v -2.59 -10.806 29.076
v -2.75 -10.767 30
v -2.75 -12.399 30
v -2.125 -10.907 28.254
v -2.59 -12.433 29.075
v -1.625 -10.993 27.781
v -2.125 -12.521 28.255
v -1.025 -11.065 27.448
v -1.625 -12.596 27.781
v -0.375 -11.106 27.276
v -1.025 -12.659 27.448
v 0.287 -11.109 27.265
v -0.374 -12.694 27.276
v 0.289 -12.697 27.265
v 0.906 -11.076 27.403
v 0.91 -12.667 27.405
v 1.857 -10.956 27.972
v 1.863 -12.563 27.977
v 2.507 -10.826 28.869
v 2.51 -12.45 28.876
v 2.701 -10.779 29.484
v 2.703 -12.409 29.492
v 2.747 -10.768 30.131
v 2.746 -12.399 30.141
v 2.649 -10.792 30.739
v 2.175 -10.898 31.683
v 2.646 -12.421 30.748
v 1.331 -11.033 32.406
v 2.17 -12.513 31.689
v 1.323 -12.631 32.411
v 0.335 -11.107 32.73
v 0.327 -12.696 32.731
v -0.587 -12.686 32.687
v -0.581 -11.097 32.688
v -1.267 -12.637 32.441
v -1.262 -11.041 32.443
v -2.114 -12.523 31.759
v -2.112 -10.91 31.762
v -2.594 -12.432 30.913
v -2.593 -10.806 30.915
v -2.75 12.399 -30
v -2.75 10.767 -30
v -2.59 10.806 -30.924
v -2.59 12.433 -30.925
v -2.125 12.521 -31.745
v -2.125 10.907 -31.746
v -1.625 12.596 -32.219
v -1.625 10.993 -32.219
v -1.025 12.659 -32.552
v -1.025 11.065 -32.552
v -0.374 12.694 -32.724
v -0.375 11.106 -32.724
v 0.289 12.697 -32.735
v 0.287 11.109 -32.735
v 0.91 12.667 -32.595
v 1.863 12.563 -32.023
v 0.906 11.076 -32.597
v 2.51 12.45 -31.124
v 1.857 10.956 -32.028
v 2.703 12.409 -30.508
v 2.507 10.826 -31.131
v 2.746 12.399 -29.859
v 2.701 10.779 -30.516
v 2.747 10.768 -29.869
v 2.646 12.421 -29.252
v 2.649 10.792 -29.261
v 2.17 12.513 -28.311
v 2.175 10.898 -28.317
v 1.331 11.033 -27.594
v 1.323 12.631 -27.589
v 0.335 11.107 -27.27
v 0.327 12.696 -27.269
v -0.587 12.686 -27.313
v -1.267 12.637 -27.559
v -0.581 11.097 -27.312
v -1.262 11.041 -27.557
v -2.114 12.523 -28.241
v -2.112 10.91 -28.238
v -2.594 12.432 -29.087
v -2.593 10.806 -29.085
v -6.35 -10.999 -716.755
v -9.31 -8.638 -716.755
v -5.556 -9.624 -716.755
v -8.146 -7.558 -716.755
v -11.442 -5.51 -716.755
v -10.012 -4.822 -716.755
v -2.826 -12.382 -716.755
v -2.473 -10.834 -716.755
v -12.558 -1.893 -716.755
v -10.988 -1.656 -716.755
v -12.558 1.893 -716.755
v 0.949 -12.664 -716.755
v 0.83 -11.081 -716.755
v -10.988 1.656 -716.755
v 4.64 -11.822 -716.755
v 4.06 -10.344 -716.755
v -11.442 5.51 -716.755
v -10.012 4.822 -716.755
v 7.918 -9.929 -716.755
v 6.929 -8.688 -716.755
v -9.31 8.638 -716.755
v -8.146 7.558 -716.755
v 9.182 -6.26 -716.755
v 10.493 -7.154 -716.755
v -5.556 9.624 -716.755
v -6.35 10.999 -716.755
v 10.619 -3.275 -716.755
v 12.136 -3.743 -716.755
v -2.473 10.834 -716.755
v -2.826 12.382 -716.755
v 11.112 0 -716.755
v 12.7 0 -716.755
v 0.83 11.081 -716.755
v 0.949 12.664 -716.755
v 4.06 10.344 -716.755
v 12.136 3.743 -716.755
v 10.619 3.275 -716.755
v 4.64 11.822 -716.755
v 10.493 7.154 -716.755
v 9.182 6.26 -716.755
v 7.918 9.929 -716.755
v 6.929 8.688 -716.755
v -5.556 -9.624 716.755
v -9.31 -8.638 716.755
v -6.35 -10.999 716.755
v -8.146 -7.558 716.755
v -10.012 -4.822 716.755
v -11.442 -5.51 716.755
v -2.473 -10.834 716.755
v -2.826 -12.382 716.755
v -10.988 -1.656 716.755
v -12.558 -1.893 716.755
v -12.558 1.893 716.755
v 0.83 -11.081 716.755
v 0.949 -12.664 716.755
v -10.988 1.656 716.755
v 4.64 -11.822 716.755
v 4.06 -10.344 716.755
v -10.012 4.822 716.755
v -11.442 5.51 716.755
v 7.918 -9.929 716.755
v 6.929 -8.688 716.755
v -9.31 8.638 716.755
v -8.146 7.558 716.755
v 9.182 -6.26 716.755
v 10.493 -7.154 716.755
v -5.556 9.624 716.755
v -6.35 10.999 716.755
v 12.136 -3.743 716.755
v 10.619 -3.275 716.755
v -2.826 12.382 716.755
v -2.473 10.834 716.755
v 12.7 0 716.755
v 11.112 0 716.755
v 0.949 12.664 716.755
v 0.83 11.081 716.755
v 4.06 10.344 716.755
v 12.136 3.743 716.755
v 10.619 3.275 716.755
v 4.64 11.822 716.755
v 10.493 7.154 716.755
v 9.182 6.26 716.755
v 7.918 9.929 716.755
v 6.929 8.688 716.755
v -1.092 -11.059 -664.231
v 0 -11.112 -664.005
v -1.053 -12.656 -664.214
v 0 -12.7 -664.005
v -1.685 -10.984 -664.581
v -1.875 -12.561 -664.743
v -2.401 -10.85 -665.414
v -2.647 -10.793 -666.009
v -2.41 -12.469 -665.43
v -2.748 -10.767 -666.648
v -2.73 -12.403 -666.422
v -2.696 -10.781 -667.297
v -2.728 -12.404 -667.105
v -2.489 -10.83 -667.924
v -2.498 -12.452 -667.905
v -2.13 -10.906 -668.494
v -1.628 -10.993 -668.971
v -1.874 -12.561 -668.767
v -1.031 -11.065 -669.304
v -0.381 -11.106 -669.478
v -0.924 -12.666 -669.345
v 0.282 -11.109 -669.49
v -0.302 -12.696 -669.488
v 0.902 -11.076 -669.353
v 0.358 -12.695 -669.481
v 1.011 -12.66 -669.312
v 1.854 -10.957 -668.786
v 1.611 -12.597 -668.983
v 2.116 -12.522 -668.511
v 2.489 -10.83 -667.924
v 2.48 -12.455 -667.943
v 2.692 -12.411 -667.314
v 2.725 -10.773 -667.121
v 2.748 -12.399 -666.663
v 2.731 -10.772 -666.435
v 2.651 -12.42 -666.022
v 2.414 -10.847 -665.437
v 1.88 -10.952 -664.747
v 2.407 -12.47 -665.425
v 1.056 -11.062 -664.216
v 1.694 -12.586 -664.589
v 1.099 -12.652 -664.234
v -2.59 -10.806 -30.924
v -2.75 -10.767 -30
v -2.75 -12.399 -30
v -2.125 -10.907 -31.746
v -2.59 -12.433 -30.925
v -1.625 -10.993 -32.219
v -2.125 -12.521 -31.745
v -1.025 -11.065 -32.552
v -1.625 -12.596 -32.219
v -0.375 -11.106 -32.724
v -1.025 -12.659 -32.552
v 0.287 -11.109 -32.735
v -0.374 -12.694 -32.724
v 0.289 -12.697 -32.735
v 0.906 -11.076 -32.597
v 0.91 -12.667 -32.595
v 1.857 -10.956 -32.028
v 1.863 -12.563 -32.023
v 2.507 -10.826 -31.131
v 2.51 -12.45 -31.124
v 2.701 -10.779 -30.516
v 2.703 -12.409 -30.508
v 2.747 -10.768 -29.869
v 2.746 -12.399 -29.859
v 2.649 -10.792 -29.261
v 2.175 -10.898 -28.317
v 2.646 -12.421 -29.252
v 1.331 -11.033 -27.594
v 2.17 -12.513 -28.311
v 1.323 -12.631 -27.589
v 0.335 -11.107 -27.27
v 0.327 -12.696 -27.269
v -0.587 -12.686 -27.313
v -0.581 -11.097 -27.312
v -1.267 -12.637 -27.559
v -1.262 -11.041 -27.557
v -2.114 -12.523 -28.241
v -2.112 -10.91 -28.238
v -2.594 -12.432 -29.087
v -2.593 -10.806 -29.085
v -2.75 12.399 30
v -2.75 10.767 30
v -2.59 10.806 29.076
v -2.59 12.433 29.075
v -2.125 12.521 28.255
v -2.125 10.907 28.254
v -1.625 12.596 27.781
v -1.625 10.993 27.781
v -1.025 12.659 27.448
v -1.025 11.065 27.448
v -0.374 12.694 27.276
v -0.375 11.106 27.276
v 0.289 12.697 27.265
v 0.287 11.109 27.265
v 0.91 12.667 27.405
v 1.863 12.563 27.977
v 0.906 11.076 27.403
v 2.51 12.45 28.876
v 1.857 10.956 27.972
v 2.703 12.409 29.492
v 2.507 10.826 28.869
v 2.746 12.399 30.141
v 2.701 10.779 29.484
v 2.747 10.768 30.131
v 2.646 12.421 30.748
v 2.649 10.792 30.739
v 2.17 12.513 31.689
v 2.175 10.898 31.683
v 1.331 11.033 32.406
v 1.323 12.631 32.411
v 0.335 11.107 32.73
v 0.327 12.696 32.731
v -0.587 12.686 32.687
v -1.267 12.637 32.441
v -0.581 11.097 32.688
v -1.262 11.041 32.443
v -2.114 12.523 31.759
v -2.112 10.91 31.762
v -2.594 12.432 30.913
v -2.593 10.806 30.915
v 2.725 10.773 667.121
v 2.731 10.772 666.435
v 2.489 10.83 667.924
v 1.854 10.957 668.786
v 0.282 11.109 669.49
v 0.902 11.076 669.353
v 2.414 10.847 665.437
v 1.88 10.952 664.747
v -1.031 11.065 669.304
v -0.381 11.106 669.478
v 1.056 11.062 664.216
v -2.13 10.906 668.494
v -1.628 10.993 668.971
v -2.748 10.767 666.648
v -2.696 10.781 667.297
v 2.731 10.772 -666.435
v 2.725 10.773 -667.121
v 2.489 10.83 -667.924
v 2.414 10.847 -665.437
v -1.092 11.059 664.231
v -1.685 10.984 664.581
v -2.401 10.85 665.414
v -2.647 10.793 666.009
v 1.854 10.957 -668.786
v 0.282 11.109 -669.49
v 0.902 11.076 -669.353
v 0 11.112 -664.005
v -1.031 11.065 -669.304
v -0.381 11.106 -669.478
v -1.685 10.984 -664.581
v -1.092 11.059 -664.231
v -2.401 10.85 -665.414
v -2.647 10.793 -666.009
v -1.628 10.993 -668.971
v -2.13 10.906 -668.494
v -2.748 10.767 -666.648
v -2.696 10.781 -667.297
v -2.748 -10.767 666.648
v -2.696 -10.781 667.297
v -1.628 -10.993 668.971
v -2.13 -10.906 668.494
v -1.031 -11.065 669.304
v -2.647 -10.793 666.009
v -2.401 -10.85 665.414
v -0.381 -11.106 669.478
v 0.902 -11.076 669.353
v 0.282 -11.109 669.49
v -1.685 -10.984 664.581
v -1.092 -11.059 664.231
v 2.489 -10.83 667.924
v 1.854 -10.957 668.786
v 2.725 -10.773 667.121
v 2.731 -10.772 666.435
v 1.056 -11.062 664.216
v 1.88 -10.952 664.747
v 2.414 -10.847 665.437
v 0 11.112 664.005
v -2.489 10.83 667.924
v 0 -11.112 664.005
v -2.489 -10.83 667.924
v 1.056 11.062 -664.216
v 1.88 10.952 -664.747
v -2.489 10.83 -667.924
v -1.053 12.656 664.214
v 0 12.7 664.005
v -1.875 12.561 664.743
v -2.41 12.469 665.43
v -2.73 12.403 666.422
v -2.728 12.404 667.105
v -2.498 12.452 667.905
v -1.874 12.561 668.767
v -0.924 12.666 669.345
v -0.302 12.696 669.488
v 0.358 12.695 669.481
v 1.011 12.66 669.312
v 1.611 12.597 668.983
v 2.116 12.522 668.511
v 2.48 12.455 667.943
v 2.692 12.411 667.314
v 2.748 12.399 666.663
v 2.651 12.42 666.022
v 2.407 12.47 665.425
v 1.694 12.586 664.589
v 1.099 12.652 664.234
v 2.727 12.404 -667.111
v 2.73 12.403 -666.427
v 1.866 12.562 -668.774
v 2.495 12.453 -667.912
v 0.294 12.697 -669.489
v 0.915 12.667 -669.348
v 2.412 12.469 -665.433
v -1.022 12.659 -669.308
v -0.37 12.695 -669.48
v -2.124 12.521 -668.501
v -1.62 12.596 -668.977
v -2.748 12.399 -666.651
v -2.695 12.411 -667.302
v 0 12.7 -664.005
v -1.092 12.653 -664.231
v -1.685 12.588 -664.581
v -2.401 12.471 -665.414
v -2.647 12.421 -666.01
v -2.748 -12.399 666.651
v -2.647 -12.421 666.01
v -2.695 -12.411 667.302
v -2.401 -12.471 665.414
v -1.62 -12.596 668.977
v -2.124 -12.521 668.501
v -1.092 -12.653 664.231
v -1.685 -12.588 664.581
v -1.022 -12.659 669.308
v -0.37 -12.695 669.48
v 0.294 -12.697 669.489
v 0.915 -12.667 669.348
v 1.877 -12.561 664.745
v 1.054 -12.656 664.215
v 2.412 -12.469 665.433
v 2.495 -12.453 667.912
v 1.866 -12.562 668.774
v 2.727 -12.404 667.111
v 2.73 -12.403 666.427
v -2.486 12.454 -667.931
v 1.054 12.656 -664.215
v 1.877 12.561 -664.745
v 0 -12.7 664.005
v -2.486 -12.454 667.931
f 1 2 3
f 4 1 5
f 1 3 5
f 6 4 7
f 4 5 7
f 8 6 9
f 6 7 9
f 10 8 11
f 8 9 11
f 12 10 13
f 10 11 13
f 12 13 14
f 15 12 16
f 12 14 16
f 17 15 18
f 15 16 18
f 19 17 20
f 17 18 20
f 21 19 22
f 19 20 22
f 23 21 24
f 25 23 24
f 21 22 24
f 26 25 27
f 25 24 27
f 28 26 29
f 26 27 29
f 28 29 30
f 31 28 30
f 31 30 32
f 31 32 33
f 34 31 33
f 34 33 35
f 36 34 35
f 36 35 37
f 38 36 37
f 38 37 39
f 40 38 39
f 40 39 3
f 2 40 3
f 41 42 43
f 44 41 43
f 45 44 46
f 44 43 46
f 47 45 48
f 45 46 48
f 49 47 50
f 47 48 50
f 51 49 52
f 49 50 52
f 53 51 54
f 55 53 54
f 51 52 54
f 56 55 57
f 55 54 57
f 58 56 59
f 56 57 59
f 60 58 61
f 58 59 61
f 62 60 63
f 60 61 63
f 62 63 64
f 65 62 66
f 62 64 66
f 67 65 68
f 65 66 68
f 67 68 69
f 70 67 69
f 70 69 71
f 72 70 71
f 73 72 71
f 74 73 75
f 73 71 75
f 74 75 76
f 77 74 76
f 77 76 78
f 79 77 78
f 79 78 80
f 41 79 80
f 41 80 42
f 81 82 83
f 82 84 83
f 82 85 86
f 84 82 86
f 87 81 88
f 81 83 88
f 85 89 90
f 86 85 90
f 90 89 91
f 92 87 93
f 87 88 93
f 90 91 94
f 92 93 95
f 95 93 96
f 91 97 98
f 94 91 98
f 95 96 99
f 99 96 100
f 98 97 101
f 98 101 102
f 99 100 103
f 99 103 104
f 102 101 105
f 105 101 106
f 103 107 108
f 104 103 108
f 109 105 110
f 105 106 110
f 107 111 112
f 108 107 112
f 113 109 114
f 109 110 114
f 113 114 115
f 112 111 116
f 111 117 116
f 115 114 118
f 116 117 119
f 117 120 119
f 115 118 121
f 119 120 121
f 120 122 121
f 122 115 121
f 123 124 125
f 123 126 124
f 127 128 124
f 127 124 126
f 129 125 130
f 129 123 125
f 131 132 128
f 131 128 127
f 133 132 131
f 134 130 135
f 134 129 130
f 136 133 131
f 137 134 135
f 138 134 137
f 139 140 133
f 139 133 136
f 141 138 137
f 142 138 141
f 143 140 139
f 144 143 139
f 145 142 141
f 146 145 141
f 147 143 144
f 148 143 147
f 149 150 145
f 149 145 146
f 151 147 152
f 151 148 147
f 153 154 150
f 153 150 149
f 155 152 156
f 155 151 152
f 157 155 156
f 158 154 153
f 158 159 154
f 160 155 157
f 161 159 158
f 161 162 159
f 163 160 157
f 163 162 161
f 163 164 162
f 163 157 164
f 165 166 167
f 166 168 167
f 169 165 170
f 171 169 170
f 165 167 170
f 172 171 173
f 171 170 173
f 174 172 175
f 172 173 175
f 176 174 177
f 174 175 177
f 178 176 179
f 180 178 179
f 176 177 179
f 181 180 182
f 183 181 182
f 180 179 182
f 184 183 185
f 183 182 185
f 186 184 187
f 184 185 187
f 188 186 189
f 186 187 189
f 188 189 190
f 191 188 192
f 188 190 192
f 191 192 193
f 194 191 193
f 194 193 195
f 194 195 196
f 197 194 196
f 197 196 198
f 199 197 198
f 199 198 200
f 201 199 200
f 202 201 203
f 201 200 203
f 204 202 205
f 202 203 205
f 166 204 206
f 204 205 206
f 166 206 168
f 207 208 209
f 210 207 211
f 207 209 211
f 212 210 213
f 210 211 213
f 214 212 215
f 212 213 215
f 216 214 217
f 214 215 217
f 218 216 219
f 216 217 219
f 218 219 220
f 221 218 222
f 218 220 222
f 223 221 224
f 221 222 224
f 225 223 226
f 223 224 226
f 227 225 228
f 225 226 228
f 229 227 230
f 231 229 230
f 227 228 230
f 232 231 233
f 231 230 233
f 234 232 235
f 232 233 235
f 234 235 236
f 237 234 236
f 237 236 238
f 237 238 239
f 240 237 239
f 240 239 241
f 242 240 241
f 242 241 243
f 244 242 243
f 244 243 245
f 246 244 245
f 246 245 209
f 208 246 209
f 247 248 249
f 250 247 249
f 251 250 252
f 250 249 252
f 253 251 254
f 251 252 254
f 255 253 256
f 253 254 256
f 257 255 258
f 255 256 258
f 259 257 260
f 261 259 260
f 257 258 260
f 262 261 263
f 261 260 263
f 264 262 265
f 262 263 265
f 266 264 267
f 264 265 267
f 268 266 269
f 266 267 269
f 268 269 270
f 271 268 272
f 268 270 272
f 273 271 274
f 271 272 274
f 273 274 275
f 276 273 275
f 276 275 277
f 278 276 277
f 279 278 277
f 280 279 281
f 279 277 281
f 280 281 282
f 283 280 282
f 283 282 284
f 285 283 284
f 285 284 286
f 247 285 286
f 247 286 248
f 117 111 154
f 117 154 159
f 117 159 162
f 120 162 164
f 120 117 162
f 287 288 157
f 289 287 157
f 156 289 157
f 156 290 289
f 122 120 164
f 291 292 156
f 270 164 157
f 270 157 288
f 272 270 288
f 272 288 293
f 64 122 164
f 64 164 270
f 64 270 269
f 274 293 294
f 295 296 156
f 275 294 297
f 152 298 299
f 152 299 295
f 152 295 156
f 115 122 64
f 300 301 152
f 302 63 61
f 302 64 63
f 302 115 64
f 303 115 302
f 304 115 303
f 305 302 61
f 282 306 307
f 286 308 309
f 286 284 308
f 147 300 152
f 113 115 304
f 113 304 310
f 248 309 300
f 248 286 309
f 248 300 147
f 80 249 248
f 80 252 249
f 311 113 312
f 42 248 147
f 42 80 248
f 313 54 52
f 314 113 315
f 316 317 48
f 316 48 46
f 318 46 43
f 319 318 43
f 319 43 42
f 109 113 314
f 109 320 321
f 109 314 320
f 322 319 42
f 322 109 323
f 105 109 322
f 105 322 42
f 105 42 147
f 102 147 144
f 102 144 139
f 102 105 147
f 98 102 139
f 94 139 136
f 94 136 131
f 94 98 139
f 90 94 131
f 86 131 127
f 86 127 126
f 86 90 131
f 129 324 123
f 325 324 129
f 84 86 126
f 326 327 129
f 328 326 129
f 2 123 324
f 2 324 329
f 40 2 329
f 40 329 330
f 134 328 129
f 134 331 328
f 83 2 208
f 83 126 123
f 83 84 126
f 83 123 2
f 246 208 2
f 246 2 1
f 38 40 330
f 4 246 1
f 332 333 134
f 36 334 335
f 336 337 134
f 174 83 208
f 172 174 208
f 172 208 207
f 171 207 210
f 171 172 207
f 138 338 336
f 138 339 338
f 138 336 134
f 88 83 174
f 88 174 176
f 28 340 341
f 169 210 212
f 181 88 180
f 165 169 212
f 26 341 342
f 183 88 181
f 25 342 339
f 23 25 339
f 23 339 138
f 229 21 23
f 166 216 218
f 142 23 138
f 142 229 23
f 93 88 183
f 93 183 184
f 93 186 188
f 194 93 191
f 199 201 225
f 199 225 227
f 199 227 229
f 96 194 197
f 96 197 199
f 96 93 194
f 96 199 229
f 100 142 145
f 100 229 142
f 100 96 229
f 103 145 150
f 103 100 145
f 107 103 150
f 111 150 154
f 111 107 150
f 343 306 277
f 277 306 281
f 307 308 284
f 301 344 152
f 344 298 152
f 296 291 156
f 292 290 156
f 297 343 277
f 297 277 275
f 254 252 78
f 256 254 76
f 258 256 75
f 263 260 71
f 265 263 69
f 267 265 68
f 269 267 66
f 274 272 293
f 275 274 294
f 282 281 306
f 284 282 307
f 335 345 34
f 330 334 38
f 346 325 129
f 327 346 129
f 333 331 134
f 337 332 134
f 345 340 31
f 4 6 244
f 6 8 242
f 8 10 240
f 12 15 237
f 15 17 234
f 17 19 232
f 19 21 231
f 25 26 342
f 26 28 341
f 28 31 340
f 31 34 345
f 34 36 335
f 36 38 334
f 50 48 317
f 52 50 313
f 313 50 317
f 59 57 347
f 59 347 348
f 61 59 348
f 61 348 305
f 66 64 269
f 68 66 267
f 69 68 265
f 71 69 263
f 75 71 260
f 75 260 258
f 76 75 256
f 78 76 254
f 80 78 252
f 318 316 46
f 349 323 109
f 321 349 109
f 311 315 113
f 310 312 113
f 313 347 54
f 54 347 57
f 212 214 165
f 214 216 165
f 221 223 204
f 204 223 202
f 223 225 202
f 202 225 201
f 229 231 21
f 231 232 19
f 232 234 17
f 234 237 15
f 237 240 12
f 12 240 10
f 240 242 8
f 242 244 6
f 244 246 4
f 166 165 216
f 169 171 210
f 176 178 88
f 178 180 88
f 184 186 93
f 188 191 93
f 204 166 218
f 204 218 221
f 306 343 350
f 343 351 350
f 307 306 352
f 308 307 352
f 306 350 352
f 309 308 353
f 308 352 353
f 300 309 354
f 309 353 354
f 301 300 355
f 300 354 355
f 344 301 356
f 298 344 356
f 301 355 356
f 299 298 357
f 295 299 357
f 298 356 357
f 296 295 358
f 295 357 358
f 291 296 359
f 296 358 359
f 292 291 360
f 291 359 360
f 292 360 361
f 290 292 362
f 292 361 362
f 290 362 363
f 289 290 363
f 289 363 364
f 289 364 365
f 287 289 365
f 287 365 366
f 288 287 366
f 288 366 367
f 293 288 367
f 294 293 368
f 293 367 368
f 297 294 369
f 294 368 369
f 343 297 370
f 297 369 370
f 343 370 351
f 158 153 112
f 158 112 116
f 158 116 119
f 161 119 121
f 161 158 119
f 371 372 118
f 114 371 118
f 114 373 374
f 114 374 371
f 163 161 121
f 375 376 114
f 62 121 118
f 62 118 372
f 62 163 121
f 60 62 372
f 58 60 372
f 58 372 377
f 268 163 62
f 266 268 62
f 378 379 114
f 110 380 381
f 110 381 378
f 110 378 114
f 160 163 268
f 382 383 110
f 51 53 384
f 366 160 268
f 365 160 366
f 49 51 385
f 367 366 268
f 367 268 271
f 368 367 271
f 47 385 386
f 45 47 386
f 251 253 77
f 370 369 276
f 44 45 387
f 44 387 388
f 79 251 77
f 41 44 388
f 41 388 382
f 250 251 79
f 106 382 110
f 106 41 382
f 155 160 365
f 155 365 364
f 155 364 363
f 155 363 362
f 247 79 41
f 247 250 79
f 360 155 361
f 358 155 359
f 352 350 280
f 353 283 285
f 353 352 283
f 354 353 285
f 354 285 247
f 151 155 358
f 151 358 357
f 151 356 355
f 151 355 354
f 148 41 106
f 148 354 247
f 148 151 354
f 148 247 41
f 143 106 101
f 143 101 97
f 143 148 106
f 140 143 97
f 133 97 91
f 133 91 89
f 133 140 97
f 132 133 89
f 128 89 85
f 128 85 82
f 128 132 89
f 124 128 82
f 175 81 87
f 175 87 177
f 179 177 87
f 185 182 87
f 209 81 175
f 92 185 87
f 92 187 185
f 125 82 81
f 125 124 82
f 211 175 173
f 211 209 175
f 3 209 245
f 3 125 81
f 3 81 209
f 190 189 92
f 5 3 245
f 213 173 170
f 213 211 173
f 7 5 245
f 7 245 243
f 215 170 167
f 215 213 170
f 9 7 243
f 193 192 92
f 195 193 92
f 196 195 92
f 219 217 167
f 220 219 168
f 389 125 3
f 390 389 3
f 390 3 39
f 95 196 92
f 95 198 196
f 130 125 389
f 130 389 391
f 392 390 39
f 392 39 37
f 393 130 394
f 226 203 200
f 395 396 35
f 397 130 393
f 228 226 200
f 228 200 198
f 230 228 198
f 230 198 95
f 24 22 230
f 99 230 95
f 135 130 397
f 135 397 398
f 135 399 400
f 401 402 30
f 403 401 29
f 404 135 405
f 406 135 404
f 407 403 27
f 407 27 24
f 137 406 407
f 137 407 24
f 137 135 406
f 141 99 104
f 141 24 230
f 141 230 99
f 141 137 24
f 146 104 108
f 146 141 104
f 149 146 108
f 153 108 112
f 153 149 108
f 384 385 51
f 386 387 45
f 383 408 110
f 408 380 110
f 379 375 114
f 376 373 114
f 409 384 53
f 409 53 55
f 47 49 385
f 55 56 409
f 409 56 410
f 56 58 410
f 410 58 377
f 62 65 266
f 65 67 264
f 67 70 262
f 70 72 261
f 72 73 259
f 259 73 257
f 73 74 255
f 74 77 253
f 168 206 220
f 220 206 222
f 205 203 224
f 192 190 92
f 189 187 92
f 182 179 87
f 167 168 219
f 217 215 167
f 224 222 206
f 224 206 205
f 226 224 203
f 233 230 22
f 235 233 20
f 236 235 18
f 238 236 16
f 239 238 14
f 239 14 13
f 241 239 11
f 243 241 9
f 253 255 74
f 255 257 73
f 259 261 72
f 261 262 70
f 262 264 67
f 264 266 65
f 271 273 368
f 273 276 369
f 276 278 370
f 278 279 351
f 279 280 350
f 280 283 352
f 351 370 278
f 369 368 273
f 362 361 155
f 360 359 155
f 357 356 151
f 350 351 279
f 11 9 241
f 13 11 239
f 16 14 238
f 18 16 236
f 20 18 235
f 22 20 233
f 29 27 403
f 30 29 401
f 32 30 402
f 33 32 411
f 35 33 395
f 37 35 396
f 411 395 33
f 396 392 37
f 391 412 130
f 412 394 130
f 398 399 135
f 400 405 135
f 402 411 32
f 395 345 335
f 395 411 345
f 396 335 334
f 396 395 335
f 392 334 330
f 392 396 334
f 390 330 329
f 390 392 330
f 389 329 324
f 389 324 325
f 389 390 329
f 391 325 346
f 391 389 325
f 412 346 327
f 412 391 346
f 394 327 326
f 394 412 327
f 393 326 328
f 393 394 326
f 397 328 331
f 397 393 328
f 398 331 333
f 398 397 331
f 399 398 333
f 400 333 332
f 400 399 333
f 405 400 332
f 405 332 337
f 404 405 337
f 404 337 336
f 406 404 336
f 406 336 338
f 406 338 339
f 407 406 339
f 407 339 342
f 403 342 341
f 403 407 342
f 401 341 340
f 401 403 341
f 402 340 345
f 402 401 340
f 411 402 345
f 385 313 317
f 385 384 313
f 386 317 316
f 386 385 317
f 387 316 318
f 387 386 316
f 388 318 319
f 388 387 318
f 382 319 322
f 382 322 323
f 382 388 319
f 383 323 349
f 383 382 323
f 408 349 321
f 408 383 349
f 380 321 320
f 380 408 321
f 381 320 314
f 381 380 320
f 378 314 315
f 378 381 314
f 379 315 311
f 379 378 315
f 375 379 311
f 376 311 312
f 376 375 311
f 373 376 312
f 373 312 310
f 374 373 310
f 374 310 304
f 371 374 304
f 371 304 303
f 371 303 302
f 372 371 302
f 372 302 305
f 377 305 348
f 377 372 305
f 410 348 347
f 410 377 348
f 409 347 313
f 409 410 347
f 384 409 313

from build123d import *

# Parameters (mm, degrees)
SKETCH1_R                                  = 12.7
SKETCH1_R_2                                = 11.1125
BOSS_EXTRUDE1_DEPTH                        = 716.7546056
M5_CLEARANCE_HOLE1_D                       = 5.5
SKETCH7_W                                  = 2.75
SKETCH7_H                                  = 12.7
MIRROR1_AT_THE_SECOND_PLANE_COPY_1_SKETC_W = 2.75
MIRROR1_AT_THE_SECOND_PLANE_COPY_1_SKETC_H = 12.7


with BuildPart() as part:
    # Sketch1 → Boss-Extrude1 (new, symmetric)
    with BuildSketch(Plane.XY):
        Circle(SKETCH1_R)
        Circle(SKETCH1_R_2, mode=Mode.SUBTRACT)
    extrude(amount=BOSS_EXTRUDE1_DEPTH, both=True)

    # M5 Clearance Hole1 (through all)
    with Locations(Plane(origin=(0, 12.7, 0), x_dir=(1, 0, 0), z_dir=(0, 1, 0))):
        with Locations((0, 30), (0, -30)):
            Hole(M5_CLEARANCE_HOLE1_D / 2)

    # Sketch7 → M5 Clearance Hole2 (revolve, cut)
    with BuildSketch(Plane(origin=(0, 0, 666.7546056), x_dir=(0, 0, -1), z_dir=(1, 0, 0))):
        with Locations((1.375, 6.35)):
            Rectangle(SKETCH7_W, SKETCH7_H)
    m5_clearance_hole2 = revolve(axis=Axis((0, -6.35, 666.7546056), (0, 1, 0)), mode=Mode.SUBTRACT)

    # Mirror1: M5 Clearance Hole2 across plane
    add(m5_clearance_hole2.mirror(Plane.ZX), mode=Mode.SUBTRACT)

    # Mirror1 at the second plane: M5 Clearance Hole2 across plane
    add(m5_clearance_hole2.mirror(Plane.XY), mode=Mode.SUBTRACT)

    # Mirror1 at the second plane copy 1 sketc → Mirror1 at the second plane copy 1 (revolve, cut)
    with BuildSketch(Plane(origin=(0, 0, -666.7546056), x_dir=(0, 0, 1), z_dir=(1, 0, 0))):
        with Locations((1.375, 6.35)):
            Rectangle(MIRROR1_AT_THE_SECOND_PLANE_COPY_1_SKETC_W, MIRROR1_AT_THE_SECOND_PLANE_COPY_1_SKETC_H)
    revolve(axis=Axis((0, 6.35, -666.7546056), (0, -1, 0)), mode=Mode.SUBTRACT)


solid = part.part
